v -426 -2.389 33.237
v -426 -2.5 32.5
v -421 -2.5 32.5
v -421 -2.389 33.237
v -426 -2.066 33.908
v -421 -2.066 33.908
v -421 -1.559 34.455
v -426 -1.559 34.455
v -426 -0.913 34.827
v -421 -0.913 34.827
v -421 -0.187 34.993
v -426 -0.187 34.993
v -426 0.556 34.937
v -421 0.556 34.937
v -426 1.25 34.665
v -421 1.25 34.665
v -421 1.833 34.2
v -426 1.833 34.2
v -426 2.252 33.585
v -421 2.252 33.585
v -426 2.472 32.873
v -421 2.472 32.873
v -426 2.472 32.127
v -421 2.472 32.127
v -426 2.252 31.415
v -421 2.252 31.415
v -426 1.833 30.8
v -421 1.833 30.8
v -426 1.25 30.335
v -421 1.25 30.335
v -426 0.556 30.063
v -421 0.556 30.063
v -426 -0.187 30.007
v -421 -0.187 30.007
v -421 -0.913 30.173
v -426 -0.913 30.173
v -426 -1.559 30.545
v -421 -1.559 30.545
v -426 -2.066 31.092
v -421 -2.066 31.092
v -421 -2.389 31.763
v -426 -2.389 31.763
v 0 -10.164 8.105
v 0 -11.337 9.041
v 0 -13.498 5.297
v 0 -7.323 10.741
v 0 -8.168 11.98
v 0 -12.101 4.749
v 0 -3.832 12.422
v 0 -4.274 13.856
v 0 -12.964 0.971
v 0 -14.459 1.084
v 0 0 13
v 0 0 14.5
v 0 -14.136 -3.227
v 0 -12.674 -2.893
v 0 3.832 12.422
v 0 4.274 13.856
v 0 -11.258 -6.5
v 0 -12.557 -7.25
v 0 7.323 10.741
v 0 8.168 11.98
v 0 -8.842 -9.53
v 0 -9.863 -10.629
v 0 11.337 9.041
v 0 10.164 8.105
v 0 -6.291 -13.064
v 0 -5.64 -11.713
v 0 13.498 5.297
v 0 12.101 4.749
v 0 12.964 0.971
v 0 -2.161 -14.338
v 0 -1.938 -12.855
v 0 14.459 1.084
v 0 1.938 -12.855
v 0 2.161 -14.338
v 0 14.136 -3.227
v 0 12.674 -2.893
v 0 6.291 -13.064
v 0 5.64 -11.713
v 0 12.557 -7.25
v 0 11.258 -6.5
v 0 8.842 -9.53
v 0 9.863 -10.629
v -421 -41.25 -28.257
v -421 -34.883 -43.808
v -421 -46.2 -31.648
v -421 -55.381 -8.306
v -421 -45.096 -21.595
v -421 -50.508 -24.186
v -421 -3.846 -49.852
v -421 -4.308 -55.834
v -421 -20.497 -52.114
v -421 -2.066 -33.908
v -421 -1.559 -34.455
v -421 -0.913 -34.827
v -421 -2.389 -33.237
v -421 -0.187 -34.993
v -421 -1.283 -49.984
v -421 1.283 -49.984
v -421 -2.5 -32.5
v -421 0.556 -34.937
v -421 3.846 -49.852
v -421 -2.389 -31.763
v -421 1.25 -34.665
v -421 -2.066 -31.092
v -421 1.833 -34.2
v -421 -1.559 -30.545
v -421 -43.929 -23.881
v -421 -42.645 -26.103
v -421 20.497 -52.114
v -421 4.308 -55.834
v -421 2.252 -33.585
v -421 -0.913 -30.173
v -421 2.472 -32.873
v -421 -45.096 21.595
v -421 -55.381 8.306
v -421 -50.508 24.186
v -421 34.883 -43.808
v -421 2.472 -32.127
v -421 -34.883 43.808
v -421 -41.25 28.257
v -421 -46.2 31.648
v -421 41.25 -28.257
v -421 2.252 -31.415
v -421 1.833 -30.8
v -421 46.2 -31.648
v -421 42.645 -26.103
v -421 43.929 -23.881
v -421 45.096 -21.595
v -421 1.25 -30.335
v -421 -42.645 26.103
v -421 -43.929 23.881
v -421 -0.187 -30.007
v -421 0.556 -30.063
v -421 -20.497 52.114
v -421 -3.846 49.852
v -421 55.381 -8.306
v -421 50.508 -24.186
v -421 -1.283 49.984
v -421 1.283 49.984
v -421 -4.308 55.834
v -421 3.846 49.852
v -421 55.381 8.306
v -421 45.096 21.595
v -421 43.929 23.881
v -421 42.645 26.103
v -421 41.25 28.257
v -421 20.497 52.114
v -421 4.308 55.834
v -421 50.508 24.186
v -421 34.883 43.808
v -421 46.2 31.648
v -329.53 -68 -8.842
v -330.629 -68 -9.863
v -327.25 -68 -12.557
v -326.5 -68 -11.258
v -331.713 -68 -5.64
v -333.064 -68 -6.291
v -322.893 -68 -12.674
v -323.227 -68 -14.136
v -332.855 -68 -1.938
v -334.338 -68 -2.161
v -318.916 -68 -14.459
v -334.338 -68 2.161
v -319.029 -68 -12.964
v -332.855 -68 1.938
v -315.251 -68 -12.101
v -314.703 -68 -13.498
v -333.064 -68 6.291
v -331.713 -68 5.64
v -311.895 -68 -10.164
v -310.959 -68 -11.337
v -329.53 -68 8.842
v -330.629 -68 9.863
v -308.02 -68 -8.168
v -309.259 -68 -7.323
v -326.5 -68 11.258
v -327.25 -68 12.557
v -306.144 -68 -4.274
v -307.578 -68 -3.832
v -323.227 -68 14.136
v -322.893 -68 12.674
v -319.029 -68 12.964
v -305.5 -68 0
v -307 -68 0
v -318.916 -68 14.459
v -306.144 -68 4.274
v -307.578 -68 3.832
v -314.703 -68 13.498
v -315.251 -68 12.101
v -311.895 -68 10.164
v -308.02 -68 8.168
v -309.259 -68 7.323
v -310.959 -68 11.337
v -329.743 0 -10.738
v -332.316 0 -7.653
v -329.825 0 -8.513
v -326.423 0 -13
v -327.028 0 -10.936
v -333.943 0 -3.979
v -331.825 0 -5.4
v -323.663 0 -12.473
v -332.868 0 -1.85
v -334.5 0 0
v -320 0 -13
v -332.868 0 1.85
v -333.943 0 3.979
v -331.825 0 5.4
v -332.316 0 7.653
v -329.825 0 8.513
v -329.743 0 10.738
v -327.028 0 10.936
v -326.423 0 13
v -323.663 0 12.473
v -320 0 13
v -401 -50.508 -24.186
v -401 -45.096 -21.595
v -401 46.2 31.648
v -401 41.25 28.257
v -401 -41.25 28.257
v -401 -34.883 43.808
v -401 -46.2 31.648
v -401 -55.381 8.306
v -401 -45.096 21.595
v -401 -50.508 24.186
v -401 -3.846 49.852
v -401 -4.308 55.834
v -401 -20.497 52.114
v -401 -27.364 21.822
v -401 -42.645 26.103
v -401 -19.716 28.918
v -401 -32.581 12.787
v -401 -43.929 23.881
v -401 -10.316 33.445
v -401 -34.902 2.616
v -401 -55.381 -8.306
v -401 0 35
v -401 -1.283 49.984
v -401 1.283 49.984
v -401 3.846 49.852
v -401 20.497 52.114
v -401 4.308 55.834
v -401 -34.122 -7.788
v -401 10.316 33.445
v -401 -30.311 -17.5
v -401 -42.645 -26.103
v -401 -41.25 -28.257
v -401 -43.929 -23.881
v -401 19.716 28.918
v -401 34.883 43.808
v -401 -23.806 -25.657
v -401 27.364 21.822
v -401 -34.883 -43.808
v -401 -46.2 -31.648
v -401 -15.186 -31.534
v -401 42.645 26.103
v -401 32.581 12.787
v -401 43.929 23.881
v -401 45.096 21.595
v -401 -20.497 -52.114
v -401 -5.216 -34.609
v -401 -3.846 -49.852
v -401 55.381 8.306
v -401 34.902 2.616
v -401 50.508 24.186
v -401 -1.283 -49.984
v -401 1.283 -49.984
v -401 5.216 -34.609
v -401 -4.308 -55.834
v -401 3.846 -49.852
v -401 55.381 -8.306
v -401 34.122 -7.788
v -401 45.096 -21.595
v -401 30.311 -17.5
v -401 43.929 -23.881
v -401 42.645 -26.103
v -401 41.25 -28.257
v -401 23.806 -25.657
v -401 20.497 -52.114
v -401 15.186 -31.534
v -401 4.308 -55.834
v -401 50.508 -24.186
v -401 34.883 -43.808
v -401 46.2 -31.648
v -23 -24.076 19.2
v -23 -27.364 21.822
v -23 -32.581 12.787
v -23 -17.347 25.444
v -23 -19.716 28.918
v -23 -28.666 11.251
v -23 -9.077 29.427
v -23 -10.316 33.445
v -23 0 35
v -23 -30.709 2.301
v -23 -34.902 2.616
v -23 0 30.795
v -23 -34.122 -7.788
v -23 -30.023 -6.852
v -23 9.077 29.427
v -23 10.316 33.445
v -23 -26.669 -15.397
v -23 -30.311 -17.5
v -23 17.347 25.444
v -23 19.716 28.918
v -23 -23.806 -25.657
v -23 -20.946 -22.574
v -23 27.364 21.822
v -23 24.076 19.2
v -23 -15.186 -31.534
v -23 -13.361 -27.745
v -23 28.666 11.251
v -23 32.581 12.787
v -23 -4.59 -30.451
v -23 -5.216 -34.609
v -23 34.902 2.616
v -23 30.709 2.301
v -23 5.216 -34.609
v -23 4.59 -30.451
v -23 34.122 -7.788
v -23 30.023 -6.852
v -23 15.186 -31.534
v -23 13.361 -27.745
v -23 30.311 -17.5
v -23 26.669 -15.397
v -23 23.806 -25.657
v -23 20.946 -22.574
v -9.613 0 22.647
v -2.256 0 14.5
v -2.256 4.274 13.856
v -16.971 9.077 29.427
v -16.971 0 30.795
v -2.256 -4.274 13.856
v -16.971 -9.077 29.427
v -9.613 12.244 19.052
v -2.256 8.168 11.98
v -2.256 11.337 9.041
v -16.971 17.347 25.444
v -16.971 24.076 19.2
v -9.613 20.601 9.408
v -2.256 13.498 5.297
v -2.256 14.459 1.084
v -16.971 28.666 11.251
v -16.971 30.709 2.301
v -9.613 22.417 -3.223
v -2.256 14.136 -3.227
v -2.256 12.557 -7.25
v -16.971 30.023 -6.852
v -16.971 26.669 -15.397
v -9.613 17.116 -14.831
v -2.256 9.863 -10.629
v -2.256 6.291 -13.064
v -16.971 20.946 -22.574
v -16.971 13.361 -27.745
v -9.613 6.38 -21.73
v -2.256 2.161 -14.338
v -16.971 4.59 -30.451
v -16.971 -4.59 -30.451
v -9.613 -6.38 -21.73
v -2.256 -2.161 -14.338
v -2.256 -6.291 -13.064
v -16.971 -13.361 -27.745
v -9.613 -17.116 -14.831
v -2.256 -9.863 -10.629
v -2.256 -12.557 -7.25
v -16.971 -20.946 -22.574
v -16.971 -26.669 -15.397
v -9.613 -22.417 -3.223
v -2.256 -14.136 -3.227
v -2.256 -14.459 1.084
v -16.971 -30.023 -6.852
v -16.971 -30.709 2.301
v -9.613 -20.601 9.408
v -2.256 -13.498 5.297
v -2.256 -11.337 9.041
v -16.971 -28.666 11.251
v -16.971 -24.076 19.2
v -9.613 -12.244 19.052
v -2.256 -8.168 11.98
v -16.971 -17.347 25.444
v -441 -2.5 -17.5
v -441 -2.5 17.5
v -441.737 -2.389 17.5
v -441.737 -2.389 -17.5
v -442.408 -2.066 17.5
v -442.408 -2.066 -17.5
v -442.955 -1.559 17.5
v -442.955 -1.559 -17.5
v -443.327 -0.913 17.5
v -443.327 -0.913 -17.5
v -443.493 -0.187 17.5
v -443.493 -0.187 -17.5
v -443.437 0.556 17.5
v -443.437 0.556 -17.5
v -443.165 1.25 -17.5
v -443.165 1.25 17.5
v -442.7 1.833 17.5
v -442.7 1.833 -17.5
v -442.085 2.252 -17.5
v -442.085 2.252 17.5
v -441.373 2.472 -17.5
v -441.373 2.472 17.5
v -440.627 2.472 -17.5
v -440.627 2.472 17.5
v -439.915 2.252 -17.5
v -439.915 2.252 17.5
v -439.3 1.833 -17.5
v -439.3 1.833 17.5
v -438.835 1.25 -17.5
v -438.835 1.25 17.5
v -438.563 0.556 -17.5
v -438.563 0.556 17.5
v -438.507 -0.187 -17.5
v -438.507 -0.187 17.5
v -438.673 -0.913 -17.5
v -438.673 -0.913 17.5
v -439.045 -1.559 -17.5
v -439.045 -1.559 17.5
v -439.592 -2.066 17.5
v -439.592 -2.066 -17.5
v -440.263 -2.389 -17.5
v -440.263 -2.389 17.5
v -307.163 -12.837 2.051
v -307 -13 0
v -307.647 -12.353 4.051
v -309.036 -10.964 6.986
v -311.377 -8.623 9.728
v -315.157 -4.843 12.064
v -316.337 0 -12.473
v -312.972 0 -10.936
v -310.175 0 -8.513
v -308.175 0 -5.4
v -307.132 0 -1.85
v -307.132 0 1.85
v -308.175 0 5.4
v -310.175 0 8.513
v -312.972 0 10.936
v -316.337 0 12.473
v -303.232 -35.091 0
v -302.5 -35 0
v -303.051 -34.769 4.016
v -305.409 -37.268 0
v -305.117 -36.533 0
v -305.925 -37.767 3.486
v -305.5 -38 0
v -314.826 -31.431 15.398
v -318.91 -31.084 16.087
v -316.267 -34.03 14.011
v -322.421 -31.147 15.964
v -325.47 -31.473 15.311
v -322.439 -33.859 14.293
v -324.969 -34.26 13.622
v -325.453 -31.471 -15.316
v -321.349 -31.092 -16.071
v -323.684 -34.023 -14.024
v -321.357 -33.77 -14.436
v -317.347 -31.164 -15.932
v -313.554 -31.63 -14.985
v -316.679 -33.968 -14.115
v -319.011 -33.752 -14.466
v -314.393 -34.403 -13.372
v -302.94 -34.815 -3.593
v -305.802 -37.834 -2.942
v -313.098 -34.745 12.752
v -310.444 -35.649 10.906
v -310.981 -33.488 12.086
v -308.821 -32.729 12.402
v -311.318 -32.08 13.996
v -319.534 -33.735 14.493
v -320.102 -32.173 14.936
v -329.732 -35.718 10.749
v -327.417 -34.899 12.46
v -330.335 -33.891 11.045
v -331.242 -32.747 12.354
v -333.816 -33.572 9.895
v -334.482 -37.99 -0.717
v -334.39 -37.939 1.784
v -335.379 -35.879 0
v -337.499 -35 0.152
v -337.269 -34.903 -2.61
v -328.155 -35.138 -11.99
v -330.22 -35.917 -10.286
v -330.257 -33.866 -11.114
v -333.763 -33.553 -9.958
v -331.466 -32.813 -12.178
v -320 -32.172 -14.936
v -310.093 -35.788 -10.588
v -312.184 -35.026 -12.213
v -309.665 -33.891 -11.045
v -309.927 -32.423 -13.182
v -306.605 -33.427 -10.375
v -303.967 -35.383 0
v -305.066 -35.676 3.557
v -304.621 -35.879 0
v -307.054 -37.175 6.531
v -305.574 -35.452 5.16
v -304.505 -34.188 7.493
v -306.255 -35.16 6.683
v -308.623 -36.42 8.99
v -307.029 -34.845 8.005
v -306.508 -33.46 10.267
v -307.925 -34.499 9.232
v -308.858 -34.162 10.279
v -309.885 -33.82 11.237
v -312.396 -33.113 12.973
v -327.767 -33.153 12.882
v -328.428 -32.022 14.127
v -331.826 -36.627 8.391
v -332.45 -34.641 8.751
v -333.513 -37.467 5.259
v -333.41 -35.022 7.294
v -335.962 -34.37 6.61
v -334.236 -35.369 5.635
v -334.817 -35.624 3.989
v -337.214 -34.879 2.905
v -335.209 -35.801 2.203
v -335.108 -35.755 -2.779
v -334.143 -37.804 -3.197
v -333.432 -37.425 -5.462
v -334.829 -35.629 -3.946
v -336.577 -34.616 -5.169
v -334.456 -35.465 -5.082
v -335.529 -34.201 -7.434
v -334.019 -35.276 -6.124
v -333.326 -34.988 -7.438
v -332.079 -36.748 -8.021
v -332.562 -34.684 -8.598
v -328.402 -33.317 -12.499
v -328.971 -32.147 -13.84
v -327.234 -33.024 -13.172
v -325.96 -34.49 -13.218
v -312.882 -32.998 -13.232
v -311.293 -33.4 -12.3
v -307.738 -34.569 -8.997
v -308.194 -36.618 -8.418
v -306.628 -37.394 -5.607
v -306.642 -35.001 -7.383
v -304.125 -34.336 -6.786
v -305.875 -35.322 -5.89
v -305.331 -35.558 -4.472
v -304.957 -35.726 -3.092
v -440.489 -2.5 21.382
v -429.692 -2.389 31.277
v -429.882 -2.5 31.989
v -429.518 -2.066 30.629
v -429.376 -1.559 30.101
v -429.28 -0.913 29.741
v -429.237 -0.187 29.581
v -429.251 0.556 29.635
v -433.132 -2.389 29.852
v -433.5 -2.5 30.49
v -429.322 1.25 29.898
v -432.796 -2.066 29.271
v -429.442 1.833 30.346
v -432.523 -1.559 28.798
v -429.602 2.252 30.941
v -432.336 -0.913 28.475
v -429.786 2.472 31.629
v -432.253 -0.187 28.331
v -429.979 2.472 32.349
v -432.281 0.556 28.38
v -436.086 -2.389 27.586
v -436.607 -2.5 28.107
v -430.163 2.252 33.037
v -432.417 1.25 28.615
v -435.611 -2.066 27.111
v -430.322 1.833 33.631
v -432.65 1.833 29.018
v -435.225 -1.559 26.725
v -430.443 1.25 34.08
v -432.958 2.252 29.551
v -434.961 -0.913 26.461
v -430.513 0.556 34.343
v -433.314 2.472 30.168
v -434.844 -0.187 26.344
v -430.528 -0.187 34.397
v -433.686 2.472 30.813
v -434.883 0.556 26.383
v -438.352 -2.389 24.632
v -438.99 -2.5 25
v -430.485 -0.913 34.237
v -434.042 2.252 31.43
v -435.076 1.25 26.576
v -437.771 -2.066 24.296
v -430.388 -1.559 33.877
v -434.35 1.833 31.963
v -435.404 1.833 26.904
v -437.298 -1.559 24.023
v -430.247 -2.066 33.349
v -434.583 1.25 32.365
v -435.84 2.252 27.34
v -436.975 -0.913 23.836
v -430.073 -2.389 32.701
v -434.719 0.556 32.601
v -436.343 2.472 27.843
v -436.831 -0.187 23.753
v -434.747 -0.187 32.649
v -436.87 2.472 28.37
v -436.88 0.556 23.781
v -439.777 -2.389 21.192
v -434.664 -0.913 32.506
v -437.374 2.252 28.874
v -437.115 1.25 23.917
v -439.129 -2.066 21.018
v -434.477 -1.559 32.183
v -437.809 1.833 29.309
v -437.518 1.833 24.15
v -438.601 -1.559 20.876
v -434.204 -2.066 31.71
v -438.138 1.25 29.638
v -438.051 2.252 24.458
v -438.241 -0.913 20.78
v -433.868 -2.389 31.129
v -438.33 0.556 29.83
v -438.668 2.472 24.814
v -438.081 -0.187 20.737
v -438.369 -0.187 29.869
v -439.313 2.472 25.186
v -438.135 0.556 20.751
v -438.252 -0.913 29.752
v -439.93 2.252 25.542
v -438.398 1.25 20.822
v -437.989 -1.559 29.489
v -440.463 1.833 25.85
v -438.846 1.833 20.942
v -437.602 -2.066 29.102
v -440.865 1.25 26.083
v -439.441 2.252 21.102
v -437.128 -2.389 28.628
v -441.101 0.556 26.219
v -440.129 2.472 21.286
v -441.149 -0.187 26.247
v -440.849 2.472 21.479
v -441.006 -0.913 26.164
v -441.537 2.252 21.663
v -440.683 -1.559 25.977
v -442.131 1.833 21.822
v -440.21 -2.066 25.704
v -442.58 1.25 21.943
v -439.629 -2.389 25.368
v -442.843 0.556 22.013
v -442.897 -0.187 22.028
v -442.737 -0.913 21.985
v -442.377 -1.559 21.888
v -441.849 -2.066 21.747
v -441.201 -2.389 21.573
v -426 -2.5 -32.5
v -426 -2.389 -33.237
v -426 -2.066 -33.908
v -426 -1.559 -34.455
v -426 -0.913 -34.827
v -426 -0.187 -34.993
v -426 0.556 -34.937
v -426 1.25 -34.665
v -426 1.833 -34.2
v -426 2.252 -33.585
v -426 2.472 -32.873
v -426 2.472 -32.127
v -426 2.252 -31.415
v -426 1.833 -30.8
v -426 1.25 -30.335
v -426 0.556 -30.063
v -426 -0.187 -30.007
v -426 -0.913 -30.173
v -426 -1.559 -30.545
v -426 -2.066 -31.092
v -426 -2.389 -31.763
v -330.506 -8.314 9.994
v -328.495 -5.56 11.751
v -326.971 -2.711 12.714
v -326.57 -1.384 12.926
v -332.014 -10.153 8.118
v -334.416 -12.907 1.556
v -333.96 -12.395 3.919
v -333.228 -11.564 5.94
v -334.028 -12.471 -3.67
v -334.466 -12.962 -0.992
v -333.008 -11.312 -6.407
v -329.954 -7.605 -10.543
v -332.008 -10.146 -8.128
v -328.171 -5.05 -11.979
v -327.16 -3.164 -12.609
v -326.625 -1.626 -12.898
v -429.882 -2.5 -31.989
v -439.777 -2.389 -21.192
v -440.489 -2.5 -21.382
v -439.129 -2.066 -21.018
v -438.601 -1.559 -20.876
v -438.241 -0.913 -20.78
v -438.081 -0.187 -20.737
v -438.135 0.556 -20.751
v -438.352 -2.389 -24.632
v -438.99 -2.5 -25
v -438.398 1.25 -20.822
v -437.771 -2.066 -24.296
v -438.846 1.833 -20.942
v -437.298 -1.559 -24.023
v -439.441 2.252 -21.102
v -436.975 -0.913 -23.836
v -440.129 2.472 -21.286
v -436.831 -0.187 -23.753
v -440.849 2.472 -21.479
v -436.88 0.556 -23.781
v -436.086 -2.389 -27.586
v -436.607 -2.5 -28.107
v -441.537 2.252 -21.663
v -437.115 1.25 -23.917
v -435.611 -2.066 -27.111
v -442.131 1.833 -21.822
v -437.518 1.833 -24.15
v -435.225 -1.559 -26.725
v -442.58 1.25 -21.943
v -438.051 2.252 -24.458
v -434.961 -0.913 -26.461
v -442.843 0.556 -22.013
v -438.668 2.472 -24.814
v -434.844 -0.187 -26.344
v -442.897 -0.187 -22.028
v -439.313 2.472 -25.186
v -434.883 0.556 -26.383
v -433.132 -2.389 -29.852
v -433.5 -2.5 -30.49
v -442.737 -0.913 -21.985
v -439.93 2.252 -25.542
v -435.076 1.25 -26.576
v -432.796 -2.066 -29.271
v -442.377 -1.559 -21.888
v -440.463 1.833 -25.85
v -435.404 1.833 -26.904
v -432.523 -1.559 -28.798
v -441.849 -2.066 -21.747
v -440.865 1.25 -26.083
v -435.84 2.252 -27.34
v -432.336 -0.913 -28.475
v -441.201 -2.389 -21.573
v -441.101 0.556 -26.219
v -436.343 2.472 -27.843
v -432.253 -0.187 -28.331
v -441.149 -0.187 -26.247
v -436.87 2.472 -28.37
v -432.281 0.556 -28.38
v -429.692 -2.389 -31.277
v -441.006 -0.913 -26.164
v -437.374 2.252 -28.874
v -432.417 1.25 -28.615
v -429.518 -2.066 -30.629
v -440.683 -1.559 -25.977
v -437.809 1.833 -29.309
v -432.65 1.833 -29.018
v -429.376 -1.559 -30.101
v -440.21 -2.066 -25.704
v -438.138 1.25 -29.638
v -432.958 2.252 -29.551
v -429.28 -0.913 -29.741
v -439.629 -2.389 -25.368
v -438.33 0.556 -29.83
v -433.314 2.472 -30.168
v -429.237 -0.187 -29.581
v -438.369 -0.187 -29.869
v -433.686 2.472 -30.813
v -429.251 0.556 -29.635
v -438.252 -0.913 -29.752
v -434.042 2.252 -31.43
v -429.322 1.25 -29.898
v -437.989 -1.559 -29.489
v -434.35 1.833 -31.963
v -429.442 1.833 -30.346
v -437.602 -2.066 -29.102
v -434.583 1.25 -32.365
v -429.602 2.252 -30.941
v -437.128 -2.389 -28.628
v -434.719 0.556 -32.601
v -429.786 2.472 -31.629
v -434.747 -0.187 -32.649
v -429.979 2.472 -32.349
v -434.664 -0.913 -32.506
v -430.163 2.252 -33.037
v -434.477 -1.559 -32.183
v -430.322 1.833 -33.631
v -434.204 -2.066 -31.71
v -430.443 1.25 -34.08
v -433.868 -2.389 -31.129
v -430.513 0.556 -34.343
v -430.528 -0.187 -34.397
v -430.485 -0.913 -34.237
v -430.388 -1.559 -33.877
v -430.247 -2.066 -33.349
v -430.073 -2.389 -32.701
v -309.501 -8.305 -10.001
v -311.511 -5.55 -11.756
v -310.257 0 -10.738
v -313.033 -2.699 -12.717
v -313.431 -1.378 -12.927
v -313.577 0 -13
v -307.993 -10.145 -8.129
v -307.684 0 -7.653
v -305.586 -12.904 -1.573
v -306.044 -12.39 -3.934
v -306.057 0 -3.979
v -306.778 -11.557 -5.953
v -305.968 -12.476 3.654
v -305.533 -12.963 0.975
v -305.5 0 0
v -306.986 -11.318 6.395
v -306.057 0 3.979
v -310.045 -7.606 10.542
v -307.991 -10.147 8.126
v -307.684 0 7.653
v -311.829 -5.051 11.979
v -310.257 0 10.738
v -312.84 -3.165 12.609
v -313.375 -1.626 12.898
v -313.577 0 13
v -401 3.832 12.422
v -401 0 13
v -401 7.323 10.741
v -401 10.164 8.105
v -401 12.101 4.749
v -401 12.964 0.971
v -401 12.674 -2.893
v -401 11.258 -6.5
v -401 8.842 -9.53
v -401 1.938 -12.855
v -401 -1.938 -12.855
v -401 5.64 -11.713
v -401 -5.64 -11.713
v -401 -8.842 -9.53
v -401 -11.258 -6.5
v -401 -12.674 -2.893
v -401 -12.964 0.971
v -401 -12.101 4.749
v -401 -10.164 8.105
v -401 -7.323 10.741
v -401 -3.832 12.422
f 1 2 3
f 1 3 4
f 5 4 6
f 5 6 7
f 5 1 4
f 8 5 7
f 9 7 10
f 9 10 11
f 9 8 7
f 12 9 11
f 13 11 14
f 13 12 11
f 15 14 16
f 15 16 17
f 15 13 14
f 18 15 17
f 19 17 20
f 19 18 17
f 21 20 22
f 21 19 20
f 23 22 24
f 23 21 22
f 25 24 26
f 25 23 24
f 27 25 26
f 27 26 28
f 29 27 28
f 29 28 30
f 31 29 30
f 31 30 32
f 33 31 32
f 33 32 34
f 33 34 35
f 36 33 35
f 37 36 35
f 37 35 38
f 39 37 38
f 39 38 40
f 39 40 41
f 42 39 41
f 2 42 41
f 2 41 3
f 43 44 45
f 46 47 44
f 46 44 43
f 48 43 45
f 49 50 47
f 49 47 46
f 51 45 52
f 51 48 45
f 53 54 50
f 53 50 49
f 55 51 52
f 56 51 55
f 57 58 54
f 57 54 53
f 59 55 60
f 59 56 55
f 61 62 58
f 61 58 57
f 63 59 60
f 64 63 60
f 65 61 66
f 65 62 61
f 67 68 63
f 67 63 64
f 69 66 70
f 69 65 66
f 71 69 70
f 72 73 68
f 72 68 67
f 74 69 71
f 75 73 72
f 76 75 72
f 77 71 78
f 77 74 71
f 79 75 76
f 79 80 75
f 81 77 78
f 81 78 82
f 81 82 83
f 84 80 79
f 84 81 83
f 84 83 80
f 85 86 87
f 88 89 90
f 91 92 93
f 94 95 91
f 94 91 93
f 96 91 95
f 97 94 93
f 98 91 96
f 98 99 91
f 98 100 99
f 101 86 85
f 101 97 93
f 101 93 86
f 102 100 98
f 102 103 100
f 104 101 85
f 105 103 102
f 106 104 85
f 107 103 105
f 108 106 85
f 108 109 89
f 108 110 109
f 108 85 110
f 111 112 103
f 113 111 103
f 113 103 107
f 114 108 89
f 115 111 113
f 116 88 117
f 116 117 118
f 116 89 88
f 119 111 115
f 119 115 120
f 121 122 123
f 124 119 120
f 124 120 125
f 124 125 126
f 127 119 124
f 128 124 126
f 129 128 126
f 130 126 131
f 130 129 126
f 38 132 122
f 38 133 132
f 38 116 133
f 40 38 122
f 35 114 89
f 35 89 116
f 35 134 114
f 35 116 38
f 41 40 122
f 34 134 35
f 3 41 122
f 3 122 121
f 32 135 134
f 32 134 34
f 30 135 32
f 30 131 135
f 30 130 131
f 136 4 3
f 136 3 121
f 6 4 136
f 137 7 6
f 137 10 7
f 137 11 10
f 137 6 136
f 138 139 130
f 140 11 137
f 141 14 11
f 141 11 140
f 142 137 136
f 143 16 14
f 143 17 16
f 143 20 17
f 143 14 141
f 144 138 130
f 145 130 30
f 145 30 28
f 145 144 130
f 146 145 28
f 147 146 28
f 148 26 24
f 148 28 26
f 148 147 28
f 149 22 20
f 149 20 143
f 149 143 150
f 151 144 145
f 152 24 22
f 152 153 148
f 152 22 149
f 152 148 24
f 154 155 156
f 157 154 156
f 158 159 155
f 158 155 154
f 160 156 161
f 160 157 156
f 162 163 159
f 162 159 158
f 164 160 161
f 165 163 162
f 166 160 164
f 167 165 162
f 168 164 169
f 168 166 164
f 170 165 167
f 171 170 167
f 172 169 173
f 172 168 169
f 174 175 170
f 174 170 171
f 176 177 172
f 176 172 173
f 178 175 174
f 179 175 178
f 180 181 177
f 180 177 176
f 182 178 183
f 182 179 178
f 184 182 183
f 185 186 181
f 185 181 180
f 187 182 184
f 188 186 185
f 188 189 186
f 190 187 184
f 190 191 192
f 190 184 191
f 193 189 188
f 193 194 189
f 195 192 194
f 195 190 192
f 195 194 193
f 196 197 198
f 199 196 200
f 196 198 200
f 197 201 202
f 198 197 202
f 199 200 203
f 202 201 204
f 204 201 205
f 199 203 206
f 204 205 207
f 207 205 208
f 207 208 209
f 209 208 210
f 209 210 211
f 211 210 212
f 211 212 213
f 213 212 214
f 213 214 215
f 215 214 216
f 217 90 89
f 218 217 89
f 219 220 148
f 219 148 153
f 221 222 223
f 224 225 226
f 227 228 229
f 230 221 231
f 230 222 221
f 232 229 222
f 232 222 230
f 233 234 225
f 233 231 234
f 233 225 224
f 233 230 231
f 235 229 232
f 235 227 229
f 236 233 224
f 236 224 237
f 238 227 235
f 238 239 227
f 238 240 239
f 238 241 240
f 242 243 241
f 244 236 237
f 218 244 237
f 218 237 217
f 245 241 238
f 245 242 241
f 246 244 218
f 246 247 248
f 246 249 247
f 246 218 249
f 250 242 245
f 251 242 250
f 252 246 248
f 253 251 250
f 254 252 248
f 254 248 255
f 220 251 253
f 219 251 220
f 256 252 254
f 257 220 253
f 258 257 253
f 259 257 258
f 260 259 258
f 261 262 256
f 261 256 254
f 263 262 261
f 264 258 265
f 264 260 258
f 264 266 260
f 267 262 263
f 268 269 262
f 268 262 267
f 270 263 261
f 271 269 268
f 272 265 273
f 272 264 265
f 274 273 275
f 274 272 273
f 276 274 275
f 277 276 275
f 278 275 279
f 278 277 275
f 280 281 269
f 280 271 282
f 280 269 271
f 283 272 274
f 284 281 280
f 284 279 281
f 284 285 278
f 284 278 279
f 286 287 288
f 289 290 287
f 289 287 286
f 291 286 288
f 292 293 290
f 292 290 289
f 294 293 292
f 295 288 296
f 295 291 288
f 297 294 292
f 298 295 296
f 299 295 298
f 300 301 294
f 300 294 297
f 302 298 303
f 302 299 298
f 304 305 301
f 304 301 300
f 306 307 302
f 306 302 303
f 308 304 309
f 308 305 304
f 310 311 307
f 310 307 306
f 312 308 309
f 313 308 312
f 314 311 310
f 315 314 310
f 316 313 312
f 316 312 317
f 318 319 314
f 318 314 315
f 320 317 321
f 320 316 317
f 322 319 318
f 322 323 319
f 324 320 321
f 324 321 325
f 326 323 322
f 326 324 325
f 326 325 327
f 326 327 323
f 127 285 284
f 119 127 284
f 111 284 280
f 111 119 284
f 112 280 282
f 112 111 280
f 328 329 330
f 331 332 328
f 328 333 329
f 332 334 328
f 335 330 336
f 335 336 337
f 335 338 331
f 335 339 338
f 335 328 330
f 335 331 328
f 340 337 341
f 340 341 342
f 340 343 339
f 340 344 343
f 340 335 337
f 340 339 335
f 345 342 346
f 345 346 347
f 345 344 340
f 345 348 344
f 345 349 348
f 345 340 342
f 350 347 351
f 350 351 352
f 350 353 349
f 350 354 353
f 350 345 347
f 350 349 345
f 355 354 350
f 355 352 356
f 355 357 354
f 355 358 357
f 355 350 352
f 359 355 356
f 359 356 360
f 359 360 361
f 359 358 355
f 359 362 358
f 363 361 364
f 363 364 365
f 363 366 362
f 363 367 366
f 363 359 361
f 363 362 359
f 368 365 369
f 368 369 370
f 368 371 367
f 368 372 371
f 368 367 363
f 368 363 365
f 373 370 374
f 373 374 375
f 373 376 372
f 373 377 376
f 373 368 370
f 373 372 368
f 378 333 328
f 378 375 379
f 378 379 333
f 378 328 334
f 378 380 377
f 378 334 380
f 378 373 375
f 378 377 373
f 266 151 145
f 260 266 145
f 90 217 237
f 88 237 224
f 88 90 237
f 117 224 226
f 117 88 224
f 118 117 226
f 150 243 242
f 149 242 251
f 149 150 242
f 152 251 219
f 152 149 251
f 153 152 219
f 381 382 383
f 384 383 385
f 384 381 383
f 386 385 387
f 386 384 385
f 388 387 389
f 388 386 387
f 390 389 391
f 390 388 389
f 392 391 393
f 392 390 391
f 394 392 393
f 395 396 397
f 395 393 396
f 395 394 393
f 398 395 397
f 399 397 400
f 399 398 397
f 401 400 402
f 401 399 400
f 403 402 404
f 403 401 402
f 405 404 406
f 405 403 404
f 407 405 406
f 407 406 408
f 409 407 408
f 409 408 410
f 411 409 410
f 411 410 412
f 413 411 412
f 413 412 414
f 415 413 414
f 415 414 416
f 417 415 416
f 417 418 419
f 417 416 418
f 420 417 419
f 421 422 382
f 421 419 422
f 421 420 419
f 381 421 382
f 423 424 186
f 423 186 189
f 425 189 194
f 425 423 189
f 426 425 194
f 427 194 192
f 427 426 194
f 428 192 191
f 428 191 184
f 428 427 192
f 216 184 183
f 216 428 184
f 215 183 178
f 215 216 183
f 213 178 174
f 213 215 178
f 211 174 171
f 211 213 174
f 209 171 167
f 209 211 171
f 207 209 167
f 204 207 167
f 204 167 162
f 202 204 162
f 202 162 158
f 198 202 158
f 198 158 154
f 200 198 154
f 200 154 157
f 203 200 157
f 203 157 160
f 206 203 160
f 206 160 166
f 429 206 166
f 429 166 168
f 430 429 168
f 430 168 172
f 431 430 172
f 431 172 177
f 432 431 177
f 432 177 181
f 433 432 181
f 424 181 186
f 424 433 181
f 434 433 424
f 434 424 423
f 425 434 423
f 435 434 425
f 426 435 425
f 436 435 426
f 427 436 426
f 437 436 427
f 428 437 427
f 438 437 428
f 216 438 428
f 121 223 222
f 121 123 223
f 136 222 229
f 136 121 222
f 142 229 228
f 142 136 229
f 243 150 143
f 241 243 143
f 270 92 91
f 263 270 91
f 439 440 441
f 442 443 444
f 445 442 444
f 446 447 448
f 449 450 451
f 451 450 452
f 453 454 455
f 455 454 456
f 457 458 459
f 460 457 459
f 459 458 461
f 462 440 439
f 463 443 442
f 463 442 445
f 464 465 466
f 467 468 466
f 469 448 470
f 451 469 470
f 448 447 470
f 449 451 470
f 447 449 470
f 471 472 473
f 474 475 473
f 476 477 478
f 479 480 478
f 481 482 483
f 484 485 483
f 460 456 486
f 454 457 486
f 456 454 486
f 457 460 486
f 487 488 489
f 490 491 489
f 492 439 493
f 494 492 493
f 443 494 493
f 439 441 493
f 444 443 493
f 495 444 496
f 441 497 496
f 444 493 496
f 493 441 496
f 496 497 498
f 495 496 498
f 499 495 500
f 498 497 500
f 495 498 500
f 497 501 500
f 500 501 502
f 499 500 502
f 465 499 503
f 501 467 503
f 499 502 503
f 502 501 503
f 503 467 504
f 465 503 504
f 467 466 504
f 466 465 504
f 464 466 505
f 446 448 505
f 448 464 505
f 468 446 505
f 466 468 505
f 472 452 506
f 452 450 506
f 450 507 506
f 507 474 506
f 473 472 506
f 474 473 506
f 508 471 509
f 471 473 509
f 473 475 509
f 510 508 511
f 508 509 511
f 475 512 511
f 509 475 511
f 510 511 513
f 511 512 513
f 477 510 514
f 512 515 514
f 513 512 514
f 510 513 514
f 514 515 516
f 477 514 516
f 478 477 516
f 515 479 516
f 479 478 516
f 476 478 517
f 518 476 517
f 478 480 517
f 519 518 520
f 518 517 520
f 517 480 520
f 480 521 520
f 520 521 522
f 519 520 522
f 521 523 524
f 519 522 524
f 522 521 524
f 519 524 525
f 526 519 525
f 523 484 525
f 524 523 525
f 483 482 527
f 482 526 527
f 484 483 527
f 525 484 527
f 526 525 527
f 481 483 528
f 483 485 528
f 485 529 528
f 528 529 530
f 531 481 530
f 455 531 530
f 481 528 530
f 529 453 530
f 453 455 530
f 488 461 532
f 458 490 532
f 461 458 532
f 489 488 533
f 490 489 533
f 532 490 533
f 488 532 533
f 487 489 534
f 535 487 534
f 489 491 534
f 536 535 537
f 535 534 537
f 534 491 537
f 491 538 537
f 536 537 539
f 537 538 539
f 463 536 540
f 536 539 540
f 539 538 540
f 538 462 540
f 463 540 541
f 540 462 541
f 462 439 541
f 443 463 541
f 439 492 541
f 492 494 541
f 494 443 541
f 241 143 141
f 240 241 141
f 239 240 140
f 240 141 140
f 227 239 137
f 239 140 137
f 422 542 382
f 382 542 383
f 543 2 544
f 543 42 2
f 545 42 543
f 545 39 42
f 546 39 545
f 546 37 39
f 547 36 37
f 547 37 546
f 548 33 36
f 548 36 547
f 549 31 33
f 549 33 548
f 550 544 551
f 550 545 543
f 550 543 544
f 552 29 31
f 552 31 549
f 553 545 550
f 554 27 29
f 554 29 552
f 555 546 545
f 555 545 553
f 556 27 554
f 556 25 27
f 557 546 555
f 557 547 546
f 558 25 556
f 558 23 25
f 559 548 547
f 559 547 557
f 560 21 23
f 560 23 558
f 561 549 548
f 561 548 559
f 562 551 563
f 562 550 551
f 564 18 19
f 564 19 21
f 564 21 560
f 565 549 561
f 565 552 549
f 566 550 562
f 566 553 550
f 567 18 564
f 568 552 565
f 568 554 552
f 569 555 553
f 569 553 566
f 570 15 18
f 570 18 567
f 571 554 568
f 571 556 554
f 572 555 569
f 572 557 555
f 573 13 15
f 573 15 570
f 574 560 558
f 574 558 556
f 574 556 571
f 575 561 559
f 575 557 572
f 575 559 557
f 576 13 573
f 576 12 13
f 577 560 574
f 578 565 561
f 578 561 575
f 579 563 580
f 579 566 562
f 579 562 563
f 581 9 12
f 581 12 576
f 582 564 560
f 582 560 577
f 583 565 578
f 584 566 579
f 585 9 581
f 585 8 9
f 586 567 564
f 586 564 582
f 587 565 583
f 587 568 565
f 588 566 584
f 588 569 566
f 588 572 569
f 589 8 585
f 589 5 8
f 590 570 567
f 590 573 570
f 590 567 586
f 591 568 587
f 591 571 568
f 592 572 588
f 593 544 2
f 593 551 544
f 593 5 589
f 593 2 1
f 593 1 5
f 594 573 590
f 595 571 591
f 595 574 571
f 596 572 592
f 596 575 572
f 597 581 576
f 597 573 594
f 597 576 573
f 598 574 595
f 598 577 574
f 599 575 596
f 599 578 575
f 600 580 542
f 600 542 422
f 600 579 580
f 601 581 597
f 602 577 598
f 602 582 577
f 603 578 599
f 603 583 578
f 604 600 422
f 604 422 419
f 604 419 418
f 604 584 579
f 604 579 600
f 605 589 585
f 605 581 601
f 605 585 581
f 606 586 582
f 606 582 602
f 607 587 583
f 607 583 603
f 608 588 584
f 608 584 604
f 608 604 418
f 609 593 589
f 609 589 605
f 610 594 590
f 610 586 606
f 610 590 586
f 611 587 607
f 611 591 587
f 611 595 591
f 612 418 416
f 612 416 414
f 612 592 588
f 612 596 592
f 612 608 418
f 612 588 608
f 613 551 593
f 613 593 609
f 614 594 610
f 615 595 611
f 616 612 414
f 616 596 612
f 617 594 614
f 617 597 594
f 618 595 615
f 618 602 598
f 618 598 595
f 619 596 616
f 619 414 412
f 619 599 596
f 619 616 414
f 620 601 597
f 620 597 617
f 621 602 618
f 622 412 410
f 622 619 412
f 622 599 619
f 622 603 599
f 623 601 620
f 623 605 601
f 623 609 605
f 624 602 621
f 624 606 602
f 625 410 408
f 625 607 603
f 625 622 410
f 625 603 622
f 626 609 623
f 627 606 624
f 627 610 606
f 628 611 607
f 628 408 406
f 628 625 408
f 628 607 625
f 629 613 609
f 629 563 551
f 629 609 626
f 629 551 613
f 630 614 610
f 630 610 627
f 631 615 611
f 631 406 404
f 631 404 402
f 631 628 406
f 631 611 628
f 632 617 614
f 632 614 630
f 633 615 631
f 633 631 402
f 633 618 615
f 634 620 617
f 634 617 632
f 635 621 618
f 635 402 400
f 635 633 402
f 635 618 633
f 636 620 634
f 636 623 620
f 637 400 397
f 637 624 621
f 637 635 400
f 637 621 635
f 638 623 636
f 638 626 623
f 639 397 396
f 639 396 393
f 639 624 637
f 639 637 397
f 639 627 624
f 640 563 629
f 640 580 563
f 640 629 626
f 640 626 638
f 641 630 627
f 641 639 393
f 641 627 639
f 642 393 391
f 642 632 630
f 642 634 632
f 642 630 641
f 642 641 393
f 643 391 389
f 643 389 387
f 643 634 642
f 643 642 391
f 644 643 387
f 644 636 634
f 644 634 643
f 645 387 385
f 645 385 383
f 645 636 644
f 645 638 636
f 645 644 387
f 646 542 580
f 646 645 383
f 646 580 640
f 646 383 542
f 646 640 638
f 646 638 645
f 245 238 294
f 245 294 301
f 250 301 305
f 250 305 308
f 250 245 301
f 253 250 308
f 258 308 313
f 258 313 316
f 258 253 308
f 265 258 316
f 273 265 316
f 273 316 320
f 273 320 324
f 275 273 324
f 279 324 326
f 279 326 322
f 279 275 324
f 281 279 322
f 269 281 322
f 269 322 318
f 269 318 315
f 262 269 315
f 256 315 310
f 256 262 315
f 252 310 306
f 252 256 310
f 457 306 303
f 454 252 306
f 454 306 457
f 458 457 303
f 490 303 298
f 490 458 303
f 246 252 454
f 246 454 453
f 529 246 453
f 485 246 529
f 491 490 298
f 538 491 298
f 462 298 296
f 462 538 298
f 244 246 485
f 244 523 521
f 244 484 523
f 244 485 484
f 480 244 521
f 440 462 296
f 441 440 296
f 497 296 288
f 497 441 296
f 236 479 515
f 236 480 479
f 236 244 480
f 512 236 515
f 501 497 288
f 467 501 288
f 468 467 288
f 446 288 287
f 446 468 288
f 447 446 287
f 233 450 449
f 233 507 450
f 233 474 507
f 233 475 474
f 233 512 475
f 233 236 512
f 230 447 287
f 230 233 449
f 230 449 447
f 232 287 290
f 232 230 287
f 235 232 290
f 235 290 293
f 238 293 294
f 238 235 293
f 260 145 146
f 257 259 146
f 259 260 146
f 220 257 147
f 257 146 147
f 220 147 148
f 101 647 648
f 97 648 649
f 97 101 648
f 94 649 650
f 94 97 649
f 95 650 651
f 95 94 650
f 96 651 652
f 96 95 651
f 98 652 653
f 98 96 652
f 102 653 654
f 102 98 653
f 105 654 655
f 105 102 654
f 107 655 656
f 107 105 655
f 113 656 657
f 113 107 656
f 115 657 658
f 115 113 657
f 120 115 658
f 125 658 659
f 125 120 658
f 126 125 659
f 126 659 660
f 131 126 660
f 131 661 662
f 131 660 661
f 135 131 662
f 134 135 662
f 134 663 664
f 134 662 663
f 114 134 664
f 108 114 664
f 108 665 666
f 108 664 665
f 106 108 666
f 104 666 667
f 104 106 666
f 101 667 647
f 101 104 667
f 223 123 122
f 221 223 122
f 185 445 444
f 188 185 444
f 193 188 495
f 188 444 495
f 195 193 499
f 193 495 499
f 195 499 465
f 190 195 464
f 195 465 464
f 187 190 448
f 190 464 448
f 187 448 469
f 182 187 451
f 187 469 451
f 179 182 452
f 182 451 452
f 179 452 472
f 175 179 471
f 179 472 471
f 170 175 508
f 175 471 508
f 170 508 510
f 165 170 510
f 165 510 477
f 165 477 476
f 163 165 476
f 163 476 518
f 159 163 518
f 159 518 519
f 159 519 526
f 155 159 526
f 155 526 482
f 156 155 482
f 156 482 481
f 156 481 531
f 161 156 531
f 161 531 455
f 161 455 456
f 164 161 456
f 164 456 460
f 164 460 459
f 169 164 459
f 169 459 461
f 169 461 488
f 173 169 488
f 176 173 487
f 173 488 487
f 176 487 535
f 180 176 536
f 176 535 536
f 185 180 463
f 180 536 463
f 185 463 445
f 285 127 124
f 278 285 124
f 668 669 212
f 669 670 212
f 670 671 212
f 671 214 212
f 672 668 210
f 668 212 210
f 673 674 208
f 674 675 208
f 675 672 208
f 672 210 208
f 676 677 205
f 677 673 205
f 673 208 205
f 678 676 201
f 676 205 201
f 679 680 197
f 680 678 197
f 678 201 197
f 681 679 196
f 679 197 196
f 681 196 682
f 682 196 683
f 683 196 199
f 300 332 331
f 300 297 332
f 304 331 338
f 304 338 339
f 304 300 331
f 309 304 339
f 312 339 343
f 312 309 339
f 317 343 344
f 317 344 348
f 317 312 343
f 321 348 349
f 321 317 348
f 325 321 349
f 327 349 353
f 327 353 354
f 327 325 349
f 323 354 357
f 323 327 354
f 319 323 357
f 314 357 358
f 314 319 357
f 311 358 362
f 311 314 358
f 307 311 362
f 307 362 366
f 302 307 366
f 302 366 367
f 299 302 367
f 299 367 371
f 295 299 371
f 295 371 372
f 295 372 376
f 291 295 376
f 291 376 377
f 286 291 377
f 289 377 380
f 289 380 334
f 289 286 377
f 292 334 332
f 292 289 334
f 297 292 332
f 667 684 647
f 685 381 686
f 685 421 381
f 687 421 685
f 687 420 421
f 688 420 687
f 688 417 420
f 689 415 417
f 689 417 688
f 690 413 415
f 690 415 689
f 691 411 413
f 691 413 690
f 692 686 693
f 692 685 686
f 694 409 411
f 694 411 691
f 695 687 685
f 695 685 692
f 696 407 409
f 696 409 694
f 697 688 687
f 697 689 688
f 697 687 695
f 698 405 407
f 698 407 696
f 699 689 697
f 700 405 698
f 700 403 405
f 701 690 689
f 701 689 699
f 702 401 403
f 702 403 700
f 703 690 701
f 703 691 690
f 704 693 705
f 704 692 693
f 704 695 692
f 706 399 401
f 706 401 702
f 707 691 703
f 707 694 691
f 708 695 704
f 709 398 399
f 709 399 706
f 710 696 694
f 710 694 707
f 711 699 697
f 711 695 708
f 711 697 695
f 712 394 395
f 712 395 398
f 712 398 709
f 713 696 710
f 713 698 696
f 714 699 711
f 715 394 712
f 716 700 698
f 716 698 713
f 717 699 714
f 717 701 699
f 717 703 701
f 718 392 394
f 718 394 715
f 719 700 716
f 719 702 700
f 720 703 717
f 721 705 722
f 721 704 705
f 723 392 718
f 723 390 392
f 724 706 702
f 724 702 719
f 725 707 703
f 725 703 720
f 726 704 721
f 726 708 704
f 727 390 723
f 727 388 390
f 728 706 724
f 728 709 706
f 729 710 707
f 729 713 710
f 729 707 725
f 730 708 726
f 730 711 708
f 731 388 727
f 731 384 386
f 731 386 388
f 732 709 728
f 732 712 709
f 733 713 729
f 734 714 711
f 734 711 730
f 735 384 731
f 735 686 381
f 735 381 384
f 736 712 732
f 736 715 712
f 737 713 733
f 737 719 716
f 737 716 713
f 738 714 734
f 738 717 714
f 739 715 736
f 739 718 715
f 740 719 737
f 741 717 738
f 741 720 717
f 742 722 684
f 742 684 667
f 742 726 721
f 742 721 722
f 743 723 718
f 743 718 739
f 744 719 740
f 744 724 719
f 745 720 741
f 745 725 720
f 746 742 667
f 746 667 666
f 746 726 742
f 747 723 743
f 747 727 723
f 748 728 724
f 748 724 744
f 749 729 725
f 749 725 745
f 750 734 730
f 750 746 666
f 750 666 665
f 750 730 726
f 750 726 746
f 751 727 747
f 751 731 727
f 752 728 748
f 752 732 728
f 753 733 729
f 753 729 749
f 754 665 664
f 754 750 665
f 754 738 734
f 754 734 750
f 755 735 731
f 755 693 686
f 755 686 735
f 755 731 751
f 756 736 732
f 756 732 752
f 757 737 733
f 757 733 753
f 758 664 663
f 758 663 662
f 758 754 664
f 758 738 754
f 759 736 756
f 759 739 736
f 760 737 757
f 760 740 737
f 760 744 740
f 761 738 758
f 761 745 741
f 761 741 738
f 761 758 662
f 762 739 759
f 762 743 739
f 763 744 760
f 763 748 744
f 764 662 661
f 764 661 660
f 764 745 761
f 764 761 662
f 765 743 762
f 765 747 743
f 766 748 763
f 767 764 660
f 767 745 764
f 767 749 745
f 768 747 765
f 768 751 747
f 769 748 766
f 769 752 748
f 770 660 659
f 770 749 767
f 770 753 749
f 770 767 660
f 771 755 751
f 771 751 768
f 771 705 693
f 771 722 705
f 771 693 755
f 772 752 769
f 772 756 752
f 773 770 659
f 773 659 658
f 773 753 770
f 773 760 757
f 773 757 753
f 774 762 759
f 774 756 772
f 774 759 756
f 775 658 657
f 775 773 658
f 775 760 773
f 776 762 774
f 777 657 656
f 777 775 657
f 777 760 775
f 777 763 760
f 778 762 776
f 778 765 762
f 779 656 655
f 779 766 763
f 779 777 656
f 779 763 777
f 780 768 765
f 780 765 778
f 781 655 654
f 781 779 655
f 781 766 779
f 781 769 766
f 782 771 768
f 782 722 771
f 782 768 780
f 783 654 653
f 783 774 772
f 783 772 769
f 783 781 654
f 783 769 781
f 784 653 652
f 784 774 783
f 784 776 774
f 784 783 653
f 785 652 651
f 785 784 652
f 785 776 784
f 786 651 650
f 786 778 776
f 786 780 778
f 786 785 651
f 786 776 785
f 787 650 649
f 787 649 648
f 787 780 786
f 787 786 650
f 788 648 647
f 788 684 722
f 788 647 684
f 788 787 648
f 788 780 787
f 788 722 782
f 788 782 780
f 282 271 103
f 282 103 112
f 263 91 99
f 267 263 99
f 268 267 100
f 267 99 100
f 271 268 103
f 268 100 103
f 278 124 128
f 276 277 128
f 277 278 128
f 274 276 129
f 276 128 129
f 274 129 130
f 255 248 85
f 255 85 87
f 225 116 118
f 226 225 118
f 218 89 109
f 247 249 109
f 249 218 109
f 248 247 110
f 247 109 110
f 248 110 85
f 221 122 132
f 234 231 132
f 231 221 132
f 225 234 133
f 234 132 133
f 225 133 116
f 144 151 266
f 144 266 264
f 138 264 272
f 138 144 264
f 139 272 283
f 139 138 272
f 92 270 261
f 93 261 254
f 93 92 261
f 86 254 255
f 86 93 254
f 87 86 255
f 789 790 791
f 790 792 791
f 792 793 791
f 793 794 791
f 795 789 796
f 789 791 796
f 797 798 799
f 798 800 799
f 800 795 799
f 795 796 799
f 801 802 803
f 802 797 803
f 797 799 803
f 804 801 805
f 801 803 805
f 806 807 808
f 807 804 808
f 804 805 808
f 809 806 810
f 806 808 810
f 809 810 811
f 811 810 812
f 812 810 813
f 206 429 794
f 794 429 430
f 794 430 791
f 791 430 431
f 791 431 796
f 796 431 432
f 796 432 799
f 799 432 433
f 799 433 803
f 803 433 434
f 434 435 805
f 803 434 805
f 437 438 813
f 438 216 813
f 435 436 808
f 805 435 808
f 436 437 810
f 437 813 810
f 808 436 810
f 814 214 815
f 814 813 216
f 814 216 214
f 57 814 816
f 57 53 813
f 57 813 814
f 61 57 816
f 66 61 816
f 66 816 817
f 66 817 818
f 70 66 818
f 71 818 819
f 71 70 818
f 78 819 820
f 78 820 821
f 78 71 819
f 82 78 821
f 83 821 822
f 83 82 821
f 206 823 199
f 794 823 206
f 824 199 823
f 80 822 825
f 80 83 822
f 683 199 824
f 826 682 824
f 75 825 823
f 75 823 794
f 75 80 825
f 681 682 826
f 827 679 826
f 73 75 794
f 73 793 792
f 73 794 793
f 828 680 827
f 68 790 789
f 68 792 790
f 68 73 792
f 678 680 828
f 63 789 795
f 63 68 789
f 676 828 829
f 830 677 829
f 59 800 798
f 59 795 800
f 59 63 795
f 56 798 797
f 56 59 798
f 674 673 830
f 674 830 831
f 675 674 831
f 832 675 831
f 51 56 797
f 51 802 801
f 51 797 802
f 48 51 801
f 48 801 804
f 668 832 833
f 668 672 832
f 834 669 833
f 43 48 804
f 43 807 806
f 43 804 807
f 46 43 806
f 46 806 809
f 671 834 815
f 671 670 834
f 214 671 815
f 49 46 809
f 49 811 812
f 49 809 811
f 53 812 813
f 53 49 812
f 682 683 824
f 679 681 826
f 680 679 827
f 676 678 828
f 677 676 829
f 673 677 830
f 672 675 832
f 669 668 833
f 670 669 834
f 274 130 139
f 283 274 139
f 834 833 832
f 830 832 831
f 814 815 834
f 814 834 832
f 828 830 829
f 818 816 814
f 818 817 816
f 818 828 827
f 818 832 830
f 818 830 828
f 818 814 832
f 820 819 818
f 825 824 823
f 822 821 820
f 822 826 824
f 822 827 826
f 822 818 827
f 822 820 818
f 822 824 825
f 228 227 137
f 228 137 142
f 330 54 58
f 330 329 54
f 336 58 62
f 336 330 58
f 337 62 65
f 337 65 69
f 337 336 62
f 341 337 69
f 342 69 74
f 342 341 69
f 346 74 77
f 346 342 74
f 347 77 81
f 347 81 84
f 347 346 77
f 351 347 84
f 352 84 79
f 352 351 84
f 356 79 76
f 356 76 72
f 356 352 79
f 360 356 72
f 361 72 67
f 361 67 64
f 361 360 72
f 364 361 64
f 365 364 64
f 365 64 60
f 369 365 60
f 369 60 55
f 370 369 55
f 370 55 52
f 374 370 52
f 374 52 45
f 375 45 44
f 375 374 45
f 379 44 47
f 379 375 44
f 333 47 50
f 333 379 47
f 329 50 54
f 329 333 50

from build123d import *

# Parameters (mm, degrees)
F3_R     = 2.5
F5_DEPTH = 25
F6_R     = 14.5
F6_R_2   = 13
F7_DEPTH = 68
F8_R     = 13
F9_DEPTH = 68
F10_R    = 3


with BuildPart() as f1:
    # F0 (on Front) → F1 (revolve)
    with BuildSketch(Plane.XZ):
        Polygon((-401, 13), (0, 13), (0, 14.5), (-2.255578215, 14.5), (-16.97050035, 30.7946223766), (-23, 30.7946223766), (-23, 35), (-401, 35), (-401, 56), (-421, 56), (-421, 0), (-401, 0), align=None)
    revolve(axis=Axis((-210.5, 0, 0), (-1, 0, 0)))

    # F4: sweep along a path in F2
    with BuildLine(Plane.XZ) as f4_path:
        Line((-421, 32.5), (-426, 32.5))
        ThreePointArc((-426, 32.5), (-436.6066017178, 28.1066017178), (-441, 17.5))
        Line((-441, 17.5), (-441, 0))
        Line((-441, 0), (-441, -17.5))
        ThreePointArc((-441, -17.5), (-436.6066017178, -28.1066017178), (-426, -32.5))
        Line((-426, -32.5), (-421, -32.5))
    # F3 (on face) → F4 (sweep)
    with BuildSketch(Plane(origin=(-421, 0, 0), x_dir=(0, -1, 0), z_dir=(-1, 0, 0))):
        with Locations((0, 32.5)):
            Circle(F3_R)
    sweep(path=f4_path.line)

    # F3 (on face) → F5 (cut)
    with BuildSketch(Plane(origin=(-421, 0, 0), x_dir=(0, -1, 0), z_dir=(-1, 0, 0))):
        with BuildLine():
            ThreePointArc((-3.8461538462, 49.8518515262), (0, 50), (3.8461538462, 49.8518515262))
            Line((3.8461538462, 49.8518515262), (4.3076923077, 55.8340737094))
            ThreePointArc((4.3076923077, 55.8340737094), (0, 56), (-4.3076923077, 55.8340737094))
            Line((-4.3076923077, 55.8340737094), (-3.8461538462, 49.8518515262))
        make_face()
        with BuildLine():
            ThreePointArc((50.5075723829, 24.1864658845), (48.4974226119, 28), (46.1998800752, 31.6476078248))
            Line((46.1998800752, 31.6476078248), (41.2498929243, 28.2567927007))
            ThreePointArc((41.2498929243, 28.2567927007), (43.3012701892, 25), (45.0960467705, 21.5950588255))
            Line((45.0960467705, 21.5950588255), (50.5075723829, 24.1864658845))
        make_face()
        with BuildLine():
            ThreePointArc((46.1998800752, -31.6476078248), (48.4974226119, -28), (50.5075723829, -24.1864658845))
            Line((50.5075723829, -24.1864658845), (45.0960467705, -21.5950588255))
            ThreePointArc((45.0960467705, -21.5950588255), (43.3012701892, -25), (41.2498929243, -28.2567927007))
            Line((41.2498929243, -28.2567927007), (46.1998800752, -31.6476078248))
        make_face()
        with BuildLine():
            Line((-3.8461538462, -49.8518515262), (-4.3076923077, -55.8340737094))
            ThreePointArc((-4.3076923077, -55.8340737094), (0, -56), (4.3076923077, -55.8340737094))
            Line((4.3076923077, -55.8340737094), (3.8461538462, -49.8518515262))
            ThreePointArc((3.8461538462, -49.8518515262), (0, -50), (-3.8461538462, -49.8518515262))
        make_face()
        with BuildLine():
            Line((-45.0960467705, -21.5950588255), (-50.5075723829, -24.1864658845))
            ThreePointArc((-50.5075723829, -24.1864658845), (-48.4974226119, -28), (-46.1998800752, -31.6476078248))
            Line((-46.1998800752, -31.6476078248), (-41.2498929243, -28.2567927007))
            ThreePointArc((-41.2498929243, -28.2567927007), (-43.3012701892, -25), (-45.0960467705, -21.5950588255))
        make_face()
        with BuildLine():
            Line((-41.2498929243, 28.2567927007), (-46.1998800752, 31.6476078248))
            ThreePointArc((-46.1998800752, 31.6476078248), (-48.4974226119, 28), (-50.5075723829, 24.1864658845))
            Line((-50.5075723829, 24.1864658845), (-45.0960467705, 21.5950588255))
            ThreePointArc((-45.0960467705, 21.5950588255), (-43.3012701892, 25), (-41.2498929243, 28.2567927007))
        make_face()
    extrude(amount=-F5_DEPTH, mode=Mode.SUBTRACT)

    # F6 (on Front) → F7 (join)
    with BuildSketch(Plane.XZ):
        with Locations((-320, 0)):
            Circle(F6_R)
        with Locations((-320, 0)):
            Circle(F6_R_2, mode=Mode.SUBTRACT)
    extrude(amount=F7_DEPTH)

    # F8 (on face) → F9 (cut)
    with BuildSketch(Plane.XZ.offset(68)):
        with Locations((-320, 0)):
            Circle(F8_R)
    extrude(amount=-F9_DEPTH, mode=Mode.SUBTRACT)

    # F10
    f10_edges = [f1.edges().sort_by_distance(p)[0] for p in [
        (-334.5, -35, 0),
    ]]
    fillet(f10_edges, radius=F10_R)


solid = f1.part
